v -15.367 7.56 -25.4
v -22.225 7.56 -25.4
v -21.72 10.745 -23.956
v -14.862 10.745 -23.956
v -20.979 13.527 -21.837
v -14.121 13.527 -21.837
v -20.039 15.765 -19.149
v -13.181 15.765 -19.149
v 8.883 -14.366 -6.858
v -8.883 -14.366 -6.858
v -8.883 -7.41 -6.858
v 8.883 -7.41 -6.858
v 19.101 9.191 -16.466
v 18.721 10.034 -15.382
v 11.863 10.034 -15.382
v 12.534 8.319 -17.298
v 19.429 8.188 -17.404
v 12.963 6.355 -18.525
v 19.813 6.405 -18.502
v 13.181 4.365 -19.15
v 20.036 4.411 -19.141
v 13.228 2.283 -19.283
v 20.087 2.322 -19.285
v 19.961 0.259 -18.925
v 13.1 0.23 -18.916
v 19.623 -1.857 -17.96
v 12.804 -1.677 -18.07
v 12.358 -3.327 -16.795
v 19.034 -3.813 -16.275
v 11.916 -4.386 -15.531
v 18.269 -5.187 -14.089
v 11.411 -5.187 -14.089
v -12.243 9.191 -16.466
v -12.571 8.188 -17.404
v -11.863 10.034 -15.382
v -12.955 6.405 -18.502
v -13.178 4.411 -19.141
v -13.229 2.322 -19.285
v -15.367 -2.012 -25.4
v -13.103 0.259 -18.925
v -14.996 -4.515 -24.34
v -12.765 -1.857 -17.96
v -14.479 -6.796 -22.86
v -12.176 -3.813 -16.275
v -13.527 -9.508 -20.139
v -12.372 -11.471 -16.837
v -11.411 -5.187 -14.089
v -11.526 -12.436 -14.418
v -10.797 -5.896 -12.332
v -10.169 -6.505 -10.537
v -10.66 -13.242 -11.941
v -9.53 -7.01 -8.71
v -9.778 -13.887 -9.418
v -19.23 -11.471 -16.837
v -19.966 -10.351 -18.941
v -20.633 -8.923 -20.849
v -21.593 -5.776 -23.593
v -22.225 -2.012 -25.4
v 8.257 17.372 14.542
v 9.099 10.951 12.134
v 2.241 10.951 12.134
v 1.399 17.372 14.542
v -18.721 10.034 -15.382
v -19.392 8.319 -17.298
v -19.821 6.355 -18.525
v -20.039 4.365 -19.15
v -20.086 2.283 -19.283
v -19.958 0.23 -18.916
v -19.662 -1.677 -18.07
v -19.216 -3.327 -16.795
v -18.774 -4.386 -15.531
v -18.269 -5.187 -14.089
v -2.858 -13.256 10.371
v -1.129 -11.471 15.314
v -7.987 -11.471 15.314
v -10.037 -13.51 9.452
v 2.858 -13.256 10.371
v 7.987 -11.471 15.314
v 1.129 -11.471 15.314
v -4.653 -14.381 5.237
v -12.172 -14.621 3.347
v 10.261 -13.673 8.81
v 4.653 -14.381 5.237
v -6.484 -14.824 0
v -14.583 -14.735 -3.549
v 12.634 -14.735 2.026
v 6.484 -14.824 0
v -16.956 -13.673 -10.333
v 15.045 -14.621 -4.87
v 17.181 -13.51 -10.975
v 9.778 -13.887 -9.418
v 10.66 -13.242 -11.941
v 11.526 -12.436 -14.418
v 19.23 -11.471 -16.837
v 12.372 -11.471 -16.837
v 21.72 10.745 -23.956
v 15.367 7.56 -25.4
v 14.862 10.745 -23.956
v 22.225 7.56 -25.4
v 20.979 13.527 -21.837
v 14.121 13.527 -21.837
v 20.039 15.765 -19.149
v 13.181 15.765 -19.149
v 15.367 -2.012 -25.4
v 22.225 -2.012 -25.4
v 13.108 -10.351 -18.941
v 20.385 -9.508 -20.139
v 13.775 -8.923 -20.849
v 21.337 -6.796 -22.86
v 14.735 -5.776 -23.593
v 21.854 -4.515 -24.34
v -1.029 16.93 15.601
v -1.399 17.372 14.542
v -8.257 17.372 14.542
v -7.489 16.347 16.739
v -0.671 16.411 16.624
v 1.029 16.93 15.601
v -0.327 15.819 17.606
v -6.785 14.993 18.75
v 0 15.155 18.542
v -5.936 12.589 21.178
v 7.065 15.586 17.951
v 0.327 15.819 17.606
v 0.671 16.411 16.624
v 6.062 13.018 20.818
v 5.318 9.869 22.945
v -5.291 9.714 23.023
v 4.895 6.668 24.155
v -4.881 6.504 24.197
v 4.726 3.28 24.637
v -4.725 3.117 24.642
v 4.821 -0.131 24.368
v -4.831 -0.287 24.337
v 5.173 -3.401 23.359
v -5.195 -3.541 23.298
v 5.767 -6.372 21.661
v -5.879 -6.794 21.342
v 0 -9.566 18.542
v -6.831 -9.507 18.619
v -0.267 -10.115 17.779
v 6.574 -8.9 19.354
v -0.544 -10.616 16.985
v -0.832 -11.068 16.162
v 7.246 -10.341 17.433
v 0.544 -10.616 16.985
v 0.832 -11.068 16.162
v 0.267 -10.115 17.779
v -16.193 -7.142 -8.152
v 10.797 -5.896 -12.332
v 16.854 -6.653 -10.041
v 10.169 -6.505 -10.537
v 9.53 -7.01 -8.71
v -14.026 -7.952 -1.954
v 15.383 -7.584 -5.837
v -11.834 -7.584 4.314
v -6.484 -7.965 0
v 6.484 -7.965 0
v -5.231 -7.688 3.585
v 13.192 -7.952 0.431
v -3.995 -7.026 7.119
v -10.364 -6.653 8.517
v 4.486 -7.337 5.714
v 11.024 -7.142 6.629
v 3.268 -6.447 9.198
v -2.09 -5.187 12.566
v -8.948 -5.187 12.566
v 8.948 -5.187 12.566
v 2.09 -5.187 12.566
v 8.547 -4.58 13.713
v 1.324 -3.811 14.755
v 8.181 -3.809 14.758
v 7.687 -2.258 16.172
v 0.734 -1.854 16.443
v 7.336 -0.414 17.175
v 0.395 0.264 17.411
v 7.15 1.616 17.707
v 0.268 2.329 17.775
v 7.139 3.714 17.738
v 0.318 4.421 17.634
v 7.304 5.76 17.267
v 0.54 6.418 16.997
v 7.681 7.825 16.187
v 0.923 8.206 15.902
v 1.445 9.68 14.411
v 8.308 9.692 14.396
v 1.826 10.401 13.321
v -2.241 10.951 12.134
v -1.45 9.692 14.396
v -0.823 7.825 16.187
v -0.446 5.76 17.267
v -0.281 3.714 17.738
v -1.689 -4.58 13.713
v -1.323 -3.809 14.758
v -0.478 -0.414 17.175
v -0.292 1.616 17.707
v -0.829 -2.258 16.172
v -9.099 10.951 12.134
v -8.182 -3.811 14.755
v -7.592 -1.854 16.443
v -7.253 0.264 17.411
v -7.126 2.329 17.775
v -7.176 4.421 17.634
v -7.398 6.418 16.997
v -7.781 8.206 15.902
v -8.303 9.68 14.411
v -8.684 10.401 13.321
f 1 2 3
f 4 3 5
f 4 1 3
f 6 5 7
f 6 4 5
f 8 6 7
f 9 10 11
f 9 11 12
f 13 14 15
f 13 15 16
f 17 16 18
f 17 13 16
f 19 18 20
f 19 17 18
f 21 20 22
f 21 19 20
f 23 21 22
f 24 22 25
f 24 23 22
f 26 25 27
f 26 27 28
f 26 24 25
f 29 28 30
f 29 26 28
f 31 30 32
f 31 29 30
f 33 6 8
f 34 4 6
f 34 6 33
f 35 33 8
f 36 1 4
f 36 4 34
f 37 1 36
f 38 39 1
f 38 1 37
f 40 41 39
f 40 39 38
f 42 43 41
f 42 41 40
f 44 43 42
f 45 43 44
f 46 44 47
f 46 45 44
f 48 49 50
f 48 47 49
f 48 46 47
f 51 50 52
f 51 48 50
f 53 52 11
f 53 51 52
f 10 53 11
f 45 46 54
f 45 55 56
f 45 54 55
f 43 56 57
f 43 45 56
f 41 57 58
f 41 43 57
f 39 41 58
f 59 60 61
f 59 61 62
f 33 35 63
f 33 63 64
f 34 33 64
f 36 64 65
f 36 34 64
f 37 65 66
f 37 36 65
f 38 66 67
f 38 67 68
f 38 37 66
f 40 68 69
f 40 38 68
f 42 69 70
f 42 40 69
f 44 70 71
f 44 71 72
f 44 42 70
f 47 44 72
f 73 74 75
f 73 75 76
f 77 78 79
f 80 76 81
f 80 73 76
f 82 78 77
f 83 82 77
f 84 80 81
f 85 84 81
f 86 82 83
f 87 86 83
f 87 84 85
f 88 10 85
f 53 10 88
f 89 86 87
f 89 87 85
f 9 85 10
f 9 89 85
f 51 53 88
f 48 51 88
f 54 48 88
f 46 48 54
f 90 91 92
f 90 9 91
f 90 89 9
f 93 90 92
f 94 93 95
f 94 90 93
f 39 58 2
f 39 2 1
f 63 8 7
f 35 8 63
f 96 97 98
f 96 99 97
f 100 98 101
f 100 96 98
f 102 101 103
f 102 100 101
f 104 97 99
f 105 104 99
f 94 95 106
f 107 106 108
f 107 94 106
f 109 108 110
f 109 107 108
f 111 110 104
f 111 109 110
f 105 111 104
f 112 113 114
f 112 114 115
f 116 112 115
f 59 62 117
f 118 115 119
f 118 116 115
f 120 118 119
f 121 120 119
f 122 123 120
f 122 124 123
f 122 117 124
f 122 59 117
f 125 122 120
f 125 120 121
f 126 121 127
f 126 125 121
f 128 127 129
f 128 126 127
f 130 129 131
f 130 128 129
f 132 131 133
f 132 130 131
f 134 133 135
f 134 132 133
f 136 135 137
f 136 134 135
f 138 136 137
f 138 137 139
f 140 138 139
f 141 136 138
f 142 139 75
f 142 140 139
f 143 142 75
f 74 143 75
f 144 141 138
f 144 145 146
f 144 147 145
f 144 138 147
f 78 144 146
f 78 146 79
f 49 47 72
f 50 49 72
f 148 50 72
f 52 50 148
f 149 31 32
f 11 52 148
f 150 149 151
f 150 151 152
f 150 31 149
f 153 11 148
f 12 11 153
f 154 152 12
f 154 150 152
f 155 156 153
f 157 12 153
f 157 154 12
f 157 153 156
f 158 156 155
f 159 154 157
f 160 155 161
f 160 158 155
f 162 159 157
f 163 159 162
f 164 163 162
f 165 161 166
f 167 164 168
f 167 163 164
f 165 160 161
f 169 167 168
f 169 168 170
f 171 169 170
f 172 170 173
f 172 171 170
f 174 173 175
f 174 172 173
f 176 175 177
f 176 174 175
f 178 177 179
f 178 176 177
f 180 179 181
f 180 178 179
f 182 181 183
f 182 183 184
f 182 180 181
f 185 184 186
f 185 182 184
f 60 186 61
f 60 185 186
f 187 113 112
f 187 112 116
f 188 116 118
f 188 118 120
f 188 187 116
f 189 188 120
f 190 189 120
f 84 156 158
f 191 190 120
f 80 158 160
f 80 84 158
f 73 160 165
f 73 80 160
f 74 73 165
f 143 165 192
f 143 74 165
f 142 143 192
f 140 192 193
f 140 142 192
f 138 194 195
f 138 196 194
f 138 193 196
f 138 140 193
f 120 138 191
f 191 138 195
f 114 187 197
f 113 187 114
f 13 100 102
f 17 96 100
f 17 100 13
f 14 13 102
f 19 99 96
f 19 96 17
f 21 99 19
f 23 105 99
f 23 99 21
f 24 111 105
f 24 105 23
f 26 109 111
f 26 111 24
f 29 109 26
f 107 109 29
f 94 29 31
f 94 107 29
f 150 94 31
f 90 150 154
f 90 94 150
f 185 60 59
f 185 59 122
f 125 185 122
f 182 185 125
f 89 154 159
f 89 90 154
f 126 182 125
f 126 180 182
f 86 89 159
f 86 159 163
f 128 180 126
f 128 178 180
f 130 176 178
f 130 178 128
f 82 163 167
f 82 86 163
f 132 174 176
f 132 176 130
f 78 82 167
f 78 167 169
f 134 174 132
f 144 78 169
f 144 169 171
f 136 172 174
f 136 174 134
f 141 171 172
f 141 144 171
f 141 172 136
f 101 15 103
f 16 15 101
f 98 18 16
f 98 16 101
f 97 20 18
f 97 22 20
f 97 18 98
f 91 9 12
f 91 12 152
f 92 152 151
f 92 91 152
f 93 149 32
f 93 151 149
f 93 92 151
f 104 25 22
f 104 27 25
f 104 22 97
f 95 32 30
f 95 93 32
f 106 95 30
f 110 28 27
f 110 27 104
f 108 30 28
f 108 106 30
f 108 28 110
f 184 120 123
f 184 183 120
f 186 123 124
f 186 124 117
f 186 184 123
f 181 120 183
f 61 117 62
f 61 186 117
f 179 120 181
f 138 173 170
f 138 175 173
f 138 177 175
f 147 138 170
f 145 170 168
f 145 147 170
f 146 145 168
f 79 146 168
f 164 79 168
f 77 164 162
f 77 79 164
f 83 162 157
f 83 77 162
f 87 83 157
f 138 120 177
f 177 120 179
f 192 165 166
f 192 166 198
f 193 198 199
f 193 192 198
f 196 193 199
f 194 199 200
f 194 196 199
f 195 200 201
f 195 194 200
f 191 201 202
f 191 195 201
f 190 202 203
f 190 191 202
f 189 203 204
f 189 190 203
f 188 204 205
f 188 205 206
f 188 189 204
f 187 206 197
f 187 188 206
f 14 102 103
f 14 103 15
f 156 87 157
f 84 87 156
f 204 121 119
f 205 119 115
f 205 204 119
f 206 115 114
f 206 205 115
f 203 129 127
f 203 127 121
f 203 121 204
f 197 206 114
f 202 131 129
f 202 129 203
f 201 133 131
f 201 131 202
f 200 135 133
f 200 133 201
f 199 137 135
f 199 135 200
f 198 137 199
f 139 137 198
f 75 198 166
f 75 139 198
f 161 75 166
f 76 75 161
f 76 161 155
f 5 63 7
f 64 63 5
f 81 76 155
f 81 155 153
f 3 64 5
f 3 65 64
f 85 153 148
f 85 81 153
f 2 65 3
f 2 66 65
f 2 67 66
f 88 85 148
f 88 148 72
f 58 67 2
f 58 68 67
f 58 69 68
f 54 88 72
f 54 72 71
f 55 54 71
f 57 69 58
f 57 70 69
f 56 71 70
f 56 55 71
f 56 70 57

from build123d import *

# Parameters (mm, degrees)
F2_DEPTH = 25.4
F3_DEPTH = 25.4


with BuildPart() as f2:
    # F0 (on Front) → F2 (new body, symmetric)
    with BuildSketch(Plane.XZ):
        Polygon((-4.459682, 25.4), (-22.225, -25.4), (-15.367, -25.4), (-8.882659, -6.858), (0, -6.858), (8.882659, -6.858), (15.367, -25.4), (22.225, -25.4), (4.459682, 25.4), (0, 25.4), align=None)
        Polygon((-6.484341, 0), (0, 18.542), (6.484341, 0), (0, 0), align=None, mode=Mode.SUBTRACT)
    extrude(amount=F2_DEPTH, both=True)

    # F1 (on Right) → F3 (intersect, symmetric)
    with BuildSketch(Plane.YZ):
        with BuildLine():
            Line((10.950837, 12.134485), (17.372236, 14.542348))
            ThreePointArc((17.372236, 14.542348), (3.210506, 24.639486), (-11.470547, 15.313531))
            ThreePointArc((-11.470547, 15.313531), (-14.831433, -0.761551), (-11.470547, -16.836634))
            ThreePointArc((-11.470547, -16.836634), (1.458806, -26.099206), (15.7648, -19.149246))
            Line((15.7648, -19.149246), (10.034468, -15.38156))
            ThreePointArc((10.034468, -15.38156), (2.039045, -19.265796), (-5.186992, -14.089072))
            ThreePointArc((-5.186992, -14.089072), (-7.973433, -0.761551), (-5.186992, 12.56597))
            ThreePointArc((-5.186992, 12.56597), (3.027206, 17.783936), (10.950837, 12.134485))
        make_face()
    extrude(amount=F3_DEPTH, both=True, mode=Mode.INTERSECT)


solid = f2.part
